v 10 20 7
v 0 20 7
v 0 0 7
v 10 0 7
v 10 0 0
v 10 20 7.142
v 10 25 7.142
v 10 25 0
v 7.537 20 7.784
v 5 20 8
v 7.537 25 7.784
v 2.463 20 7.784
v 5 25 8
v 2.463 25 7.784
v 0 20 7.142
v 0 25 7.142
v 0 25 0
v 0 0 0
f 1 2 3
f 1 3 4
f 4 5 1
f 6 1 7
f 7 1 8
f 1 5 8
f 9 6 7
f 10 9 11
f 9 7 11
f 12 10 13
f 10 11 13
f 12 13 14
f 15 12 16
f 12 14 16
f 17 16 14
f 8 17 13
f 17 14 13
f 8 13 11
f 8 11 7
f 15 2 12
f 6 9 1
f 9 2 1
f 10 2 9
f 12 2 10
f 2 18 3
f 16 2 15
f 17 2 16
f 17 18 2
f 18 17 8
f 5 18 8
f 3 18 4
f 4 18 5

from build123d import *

# Parameters (mm, degrees)
BOX001_W            = 10
BOX001_H            = 20
BOX001_DEPTH        = 10
BOX_W               = 10
BOX_H               = 30
BOX_DEPTH           = 8
CYLINDER_R          = 15
CYLINDER_DEPTH      = 30
CYLINDER_ROLL_ANGLE = 90


with BuildPart() as flat_top:
    # Box001 → Box001 (new body)
    with BuildSketch(Plane.XY.offset(7)):
        with Locations((5, 10)):
            Rectangle(BOX001_W, BOX001_H)
    extrude(amount=BOX001_DEPTH)


with BuildPart() as pin:
    # Box → Box (new body)
    with BuildSketch(Plane.XY):
        with Locations((5, 15)):
            Rectangle(BOX_W, BOX_H)
    extrude(amount=BOX_DEPTH)


with BuildPart() as cut:
    # Cylinder → Cylinder (new body)
    with BuildSketch(Plane.XY):
        Circle(CYLINDER_R)
    extrude(amount=CYLINDER_DEPTH)


with BuildPart() as cut_1:
    # Cylinder roll: moved
    add(cut.part.rotate(Axis((0, 0, 0), (1, 0, 0)), CYLINDER_ROLL_ANGLE))


with BuildPart() as cut_2:
    # Cylinder placement: moved
    add(cut_1.part.moved(Location((5, 25, -7))))

    # Common: intersect pin
    add(pin.part, mode=Mode.INTERSECT)

    # Cut: cut flat_top
    add(flat_top.part, mode=Mode.SUBTRACT)


solid = cut_2.part
